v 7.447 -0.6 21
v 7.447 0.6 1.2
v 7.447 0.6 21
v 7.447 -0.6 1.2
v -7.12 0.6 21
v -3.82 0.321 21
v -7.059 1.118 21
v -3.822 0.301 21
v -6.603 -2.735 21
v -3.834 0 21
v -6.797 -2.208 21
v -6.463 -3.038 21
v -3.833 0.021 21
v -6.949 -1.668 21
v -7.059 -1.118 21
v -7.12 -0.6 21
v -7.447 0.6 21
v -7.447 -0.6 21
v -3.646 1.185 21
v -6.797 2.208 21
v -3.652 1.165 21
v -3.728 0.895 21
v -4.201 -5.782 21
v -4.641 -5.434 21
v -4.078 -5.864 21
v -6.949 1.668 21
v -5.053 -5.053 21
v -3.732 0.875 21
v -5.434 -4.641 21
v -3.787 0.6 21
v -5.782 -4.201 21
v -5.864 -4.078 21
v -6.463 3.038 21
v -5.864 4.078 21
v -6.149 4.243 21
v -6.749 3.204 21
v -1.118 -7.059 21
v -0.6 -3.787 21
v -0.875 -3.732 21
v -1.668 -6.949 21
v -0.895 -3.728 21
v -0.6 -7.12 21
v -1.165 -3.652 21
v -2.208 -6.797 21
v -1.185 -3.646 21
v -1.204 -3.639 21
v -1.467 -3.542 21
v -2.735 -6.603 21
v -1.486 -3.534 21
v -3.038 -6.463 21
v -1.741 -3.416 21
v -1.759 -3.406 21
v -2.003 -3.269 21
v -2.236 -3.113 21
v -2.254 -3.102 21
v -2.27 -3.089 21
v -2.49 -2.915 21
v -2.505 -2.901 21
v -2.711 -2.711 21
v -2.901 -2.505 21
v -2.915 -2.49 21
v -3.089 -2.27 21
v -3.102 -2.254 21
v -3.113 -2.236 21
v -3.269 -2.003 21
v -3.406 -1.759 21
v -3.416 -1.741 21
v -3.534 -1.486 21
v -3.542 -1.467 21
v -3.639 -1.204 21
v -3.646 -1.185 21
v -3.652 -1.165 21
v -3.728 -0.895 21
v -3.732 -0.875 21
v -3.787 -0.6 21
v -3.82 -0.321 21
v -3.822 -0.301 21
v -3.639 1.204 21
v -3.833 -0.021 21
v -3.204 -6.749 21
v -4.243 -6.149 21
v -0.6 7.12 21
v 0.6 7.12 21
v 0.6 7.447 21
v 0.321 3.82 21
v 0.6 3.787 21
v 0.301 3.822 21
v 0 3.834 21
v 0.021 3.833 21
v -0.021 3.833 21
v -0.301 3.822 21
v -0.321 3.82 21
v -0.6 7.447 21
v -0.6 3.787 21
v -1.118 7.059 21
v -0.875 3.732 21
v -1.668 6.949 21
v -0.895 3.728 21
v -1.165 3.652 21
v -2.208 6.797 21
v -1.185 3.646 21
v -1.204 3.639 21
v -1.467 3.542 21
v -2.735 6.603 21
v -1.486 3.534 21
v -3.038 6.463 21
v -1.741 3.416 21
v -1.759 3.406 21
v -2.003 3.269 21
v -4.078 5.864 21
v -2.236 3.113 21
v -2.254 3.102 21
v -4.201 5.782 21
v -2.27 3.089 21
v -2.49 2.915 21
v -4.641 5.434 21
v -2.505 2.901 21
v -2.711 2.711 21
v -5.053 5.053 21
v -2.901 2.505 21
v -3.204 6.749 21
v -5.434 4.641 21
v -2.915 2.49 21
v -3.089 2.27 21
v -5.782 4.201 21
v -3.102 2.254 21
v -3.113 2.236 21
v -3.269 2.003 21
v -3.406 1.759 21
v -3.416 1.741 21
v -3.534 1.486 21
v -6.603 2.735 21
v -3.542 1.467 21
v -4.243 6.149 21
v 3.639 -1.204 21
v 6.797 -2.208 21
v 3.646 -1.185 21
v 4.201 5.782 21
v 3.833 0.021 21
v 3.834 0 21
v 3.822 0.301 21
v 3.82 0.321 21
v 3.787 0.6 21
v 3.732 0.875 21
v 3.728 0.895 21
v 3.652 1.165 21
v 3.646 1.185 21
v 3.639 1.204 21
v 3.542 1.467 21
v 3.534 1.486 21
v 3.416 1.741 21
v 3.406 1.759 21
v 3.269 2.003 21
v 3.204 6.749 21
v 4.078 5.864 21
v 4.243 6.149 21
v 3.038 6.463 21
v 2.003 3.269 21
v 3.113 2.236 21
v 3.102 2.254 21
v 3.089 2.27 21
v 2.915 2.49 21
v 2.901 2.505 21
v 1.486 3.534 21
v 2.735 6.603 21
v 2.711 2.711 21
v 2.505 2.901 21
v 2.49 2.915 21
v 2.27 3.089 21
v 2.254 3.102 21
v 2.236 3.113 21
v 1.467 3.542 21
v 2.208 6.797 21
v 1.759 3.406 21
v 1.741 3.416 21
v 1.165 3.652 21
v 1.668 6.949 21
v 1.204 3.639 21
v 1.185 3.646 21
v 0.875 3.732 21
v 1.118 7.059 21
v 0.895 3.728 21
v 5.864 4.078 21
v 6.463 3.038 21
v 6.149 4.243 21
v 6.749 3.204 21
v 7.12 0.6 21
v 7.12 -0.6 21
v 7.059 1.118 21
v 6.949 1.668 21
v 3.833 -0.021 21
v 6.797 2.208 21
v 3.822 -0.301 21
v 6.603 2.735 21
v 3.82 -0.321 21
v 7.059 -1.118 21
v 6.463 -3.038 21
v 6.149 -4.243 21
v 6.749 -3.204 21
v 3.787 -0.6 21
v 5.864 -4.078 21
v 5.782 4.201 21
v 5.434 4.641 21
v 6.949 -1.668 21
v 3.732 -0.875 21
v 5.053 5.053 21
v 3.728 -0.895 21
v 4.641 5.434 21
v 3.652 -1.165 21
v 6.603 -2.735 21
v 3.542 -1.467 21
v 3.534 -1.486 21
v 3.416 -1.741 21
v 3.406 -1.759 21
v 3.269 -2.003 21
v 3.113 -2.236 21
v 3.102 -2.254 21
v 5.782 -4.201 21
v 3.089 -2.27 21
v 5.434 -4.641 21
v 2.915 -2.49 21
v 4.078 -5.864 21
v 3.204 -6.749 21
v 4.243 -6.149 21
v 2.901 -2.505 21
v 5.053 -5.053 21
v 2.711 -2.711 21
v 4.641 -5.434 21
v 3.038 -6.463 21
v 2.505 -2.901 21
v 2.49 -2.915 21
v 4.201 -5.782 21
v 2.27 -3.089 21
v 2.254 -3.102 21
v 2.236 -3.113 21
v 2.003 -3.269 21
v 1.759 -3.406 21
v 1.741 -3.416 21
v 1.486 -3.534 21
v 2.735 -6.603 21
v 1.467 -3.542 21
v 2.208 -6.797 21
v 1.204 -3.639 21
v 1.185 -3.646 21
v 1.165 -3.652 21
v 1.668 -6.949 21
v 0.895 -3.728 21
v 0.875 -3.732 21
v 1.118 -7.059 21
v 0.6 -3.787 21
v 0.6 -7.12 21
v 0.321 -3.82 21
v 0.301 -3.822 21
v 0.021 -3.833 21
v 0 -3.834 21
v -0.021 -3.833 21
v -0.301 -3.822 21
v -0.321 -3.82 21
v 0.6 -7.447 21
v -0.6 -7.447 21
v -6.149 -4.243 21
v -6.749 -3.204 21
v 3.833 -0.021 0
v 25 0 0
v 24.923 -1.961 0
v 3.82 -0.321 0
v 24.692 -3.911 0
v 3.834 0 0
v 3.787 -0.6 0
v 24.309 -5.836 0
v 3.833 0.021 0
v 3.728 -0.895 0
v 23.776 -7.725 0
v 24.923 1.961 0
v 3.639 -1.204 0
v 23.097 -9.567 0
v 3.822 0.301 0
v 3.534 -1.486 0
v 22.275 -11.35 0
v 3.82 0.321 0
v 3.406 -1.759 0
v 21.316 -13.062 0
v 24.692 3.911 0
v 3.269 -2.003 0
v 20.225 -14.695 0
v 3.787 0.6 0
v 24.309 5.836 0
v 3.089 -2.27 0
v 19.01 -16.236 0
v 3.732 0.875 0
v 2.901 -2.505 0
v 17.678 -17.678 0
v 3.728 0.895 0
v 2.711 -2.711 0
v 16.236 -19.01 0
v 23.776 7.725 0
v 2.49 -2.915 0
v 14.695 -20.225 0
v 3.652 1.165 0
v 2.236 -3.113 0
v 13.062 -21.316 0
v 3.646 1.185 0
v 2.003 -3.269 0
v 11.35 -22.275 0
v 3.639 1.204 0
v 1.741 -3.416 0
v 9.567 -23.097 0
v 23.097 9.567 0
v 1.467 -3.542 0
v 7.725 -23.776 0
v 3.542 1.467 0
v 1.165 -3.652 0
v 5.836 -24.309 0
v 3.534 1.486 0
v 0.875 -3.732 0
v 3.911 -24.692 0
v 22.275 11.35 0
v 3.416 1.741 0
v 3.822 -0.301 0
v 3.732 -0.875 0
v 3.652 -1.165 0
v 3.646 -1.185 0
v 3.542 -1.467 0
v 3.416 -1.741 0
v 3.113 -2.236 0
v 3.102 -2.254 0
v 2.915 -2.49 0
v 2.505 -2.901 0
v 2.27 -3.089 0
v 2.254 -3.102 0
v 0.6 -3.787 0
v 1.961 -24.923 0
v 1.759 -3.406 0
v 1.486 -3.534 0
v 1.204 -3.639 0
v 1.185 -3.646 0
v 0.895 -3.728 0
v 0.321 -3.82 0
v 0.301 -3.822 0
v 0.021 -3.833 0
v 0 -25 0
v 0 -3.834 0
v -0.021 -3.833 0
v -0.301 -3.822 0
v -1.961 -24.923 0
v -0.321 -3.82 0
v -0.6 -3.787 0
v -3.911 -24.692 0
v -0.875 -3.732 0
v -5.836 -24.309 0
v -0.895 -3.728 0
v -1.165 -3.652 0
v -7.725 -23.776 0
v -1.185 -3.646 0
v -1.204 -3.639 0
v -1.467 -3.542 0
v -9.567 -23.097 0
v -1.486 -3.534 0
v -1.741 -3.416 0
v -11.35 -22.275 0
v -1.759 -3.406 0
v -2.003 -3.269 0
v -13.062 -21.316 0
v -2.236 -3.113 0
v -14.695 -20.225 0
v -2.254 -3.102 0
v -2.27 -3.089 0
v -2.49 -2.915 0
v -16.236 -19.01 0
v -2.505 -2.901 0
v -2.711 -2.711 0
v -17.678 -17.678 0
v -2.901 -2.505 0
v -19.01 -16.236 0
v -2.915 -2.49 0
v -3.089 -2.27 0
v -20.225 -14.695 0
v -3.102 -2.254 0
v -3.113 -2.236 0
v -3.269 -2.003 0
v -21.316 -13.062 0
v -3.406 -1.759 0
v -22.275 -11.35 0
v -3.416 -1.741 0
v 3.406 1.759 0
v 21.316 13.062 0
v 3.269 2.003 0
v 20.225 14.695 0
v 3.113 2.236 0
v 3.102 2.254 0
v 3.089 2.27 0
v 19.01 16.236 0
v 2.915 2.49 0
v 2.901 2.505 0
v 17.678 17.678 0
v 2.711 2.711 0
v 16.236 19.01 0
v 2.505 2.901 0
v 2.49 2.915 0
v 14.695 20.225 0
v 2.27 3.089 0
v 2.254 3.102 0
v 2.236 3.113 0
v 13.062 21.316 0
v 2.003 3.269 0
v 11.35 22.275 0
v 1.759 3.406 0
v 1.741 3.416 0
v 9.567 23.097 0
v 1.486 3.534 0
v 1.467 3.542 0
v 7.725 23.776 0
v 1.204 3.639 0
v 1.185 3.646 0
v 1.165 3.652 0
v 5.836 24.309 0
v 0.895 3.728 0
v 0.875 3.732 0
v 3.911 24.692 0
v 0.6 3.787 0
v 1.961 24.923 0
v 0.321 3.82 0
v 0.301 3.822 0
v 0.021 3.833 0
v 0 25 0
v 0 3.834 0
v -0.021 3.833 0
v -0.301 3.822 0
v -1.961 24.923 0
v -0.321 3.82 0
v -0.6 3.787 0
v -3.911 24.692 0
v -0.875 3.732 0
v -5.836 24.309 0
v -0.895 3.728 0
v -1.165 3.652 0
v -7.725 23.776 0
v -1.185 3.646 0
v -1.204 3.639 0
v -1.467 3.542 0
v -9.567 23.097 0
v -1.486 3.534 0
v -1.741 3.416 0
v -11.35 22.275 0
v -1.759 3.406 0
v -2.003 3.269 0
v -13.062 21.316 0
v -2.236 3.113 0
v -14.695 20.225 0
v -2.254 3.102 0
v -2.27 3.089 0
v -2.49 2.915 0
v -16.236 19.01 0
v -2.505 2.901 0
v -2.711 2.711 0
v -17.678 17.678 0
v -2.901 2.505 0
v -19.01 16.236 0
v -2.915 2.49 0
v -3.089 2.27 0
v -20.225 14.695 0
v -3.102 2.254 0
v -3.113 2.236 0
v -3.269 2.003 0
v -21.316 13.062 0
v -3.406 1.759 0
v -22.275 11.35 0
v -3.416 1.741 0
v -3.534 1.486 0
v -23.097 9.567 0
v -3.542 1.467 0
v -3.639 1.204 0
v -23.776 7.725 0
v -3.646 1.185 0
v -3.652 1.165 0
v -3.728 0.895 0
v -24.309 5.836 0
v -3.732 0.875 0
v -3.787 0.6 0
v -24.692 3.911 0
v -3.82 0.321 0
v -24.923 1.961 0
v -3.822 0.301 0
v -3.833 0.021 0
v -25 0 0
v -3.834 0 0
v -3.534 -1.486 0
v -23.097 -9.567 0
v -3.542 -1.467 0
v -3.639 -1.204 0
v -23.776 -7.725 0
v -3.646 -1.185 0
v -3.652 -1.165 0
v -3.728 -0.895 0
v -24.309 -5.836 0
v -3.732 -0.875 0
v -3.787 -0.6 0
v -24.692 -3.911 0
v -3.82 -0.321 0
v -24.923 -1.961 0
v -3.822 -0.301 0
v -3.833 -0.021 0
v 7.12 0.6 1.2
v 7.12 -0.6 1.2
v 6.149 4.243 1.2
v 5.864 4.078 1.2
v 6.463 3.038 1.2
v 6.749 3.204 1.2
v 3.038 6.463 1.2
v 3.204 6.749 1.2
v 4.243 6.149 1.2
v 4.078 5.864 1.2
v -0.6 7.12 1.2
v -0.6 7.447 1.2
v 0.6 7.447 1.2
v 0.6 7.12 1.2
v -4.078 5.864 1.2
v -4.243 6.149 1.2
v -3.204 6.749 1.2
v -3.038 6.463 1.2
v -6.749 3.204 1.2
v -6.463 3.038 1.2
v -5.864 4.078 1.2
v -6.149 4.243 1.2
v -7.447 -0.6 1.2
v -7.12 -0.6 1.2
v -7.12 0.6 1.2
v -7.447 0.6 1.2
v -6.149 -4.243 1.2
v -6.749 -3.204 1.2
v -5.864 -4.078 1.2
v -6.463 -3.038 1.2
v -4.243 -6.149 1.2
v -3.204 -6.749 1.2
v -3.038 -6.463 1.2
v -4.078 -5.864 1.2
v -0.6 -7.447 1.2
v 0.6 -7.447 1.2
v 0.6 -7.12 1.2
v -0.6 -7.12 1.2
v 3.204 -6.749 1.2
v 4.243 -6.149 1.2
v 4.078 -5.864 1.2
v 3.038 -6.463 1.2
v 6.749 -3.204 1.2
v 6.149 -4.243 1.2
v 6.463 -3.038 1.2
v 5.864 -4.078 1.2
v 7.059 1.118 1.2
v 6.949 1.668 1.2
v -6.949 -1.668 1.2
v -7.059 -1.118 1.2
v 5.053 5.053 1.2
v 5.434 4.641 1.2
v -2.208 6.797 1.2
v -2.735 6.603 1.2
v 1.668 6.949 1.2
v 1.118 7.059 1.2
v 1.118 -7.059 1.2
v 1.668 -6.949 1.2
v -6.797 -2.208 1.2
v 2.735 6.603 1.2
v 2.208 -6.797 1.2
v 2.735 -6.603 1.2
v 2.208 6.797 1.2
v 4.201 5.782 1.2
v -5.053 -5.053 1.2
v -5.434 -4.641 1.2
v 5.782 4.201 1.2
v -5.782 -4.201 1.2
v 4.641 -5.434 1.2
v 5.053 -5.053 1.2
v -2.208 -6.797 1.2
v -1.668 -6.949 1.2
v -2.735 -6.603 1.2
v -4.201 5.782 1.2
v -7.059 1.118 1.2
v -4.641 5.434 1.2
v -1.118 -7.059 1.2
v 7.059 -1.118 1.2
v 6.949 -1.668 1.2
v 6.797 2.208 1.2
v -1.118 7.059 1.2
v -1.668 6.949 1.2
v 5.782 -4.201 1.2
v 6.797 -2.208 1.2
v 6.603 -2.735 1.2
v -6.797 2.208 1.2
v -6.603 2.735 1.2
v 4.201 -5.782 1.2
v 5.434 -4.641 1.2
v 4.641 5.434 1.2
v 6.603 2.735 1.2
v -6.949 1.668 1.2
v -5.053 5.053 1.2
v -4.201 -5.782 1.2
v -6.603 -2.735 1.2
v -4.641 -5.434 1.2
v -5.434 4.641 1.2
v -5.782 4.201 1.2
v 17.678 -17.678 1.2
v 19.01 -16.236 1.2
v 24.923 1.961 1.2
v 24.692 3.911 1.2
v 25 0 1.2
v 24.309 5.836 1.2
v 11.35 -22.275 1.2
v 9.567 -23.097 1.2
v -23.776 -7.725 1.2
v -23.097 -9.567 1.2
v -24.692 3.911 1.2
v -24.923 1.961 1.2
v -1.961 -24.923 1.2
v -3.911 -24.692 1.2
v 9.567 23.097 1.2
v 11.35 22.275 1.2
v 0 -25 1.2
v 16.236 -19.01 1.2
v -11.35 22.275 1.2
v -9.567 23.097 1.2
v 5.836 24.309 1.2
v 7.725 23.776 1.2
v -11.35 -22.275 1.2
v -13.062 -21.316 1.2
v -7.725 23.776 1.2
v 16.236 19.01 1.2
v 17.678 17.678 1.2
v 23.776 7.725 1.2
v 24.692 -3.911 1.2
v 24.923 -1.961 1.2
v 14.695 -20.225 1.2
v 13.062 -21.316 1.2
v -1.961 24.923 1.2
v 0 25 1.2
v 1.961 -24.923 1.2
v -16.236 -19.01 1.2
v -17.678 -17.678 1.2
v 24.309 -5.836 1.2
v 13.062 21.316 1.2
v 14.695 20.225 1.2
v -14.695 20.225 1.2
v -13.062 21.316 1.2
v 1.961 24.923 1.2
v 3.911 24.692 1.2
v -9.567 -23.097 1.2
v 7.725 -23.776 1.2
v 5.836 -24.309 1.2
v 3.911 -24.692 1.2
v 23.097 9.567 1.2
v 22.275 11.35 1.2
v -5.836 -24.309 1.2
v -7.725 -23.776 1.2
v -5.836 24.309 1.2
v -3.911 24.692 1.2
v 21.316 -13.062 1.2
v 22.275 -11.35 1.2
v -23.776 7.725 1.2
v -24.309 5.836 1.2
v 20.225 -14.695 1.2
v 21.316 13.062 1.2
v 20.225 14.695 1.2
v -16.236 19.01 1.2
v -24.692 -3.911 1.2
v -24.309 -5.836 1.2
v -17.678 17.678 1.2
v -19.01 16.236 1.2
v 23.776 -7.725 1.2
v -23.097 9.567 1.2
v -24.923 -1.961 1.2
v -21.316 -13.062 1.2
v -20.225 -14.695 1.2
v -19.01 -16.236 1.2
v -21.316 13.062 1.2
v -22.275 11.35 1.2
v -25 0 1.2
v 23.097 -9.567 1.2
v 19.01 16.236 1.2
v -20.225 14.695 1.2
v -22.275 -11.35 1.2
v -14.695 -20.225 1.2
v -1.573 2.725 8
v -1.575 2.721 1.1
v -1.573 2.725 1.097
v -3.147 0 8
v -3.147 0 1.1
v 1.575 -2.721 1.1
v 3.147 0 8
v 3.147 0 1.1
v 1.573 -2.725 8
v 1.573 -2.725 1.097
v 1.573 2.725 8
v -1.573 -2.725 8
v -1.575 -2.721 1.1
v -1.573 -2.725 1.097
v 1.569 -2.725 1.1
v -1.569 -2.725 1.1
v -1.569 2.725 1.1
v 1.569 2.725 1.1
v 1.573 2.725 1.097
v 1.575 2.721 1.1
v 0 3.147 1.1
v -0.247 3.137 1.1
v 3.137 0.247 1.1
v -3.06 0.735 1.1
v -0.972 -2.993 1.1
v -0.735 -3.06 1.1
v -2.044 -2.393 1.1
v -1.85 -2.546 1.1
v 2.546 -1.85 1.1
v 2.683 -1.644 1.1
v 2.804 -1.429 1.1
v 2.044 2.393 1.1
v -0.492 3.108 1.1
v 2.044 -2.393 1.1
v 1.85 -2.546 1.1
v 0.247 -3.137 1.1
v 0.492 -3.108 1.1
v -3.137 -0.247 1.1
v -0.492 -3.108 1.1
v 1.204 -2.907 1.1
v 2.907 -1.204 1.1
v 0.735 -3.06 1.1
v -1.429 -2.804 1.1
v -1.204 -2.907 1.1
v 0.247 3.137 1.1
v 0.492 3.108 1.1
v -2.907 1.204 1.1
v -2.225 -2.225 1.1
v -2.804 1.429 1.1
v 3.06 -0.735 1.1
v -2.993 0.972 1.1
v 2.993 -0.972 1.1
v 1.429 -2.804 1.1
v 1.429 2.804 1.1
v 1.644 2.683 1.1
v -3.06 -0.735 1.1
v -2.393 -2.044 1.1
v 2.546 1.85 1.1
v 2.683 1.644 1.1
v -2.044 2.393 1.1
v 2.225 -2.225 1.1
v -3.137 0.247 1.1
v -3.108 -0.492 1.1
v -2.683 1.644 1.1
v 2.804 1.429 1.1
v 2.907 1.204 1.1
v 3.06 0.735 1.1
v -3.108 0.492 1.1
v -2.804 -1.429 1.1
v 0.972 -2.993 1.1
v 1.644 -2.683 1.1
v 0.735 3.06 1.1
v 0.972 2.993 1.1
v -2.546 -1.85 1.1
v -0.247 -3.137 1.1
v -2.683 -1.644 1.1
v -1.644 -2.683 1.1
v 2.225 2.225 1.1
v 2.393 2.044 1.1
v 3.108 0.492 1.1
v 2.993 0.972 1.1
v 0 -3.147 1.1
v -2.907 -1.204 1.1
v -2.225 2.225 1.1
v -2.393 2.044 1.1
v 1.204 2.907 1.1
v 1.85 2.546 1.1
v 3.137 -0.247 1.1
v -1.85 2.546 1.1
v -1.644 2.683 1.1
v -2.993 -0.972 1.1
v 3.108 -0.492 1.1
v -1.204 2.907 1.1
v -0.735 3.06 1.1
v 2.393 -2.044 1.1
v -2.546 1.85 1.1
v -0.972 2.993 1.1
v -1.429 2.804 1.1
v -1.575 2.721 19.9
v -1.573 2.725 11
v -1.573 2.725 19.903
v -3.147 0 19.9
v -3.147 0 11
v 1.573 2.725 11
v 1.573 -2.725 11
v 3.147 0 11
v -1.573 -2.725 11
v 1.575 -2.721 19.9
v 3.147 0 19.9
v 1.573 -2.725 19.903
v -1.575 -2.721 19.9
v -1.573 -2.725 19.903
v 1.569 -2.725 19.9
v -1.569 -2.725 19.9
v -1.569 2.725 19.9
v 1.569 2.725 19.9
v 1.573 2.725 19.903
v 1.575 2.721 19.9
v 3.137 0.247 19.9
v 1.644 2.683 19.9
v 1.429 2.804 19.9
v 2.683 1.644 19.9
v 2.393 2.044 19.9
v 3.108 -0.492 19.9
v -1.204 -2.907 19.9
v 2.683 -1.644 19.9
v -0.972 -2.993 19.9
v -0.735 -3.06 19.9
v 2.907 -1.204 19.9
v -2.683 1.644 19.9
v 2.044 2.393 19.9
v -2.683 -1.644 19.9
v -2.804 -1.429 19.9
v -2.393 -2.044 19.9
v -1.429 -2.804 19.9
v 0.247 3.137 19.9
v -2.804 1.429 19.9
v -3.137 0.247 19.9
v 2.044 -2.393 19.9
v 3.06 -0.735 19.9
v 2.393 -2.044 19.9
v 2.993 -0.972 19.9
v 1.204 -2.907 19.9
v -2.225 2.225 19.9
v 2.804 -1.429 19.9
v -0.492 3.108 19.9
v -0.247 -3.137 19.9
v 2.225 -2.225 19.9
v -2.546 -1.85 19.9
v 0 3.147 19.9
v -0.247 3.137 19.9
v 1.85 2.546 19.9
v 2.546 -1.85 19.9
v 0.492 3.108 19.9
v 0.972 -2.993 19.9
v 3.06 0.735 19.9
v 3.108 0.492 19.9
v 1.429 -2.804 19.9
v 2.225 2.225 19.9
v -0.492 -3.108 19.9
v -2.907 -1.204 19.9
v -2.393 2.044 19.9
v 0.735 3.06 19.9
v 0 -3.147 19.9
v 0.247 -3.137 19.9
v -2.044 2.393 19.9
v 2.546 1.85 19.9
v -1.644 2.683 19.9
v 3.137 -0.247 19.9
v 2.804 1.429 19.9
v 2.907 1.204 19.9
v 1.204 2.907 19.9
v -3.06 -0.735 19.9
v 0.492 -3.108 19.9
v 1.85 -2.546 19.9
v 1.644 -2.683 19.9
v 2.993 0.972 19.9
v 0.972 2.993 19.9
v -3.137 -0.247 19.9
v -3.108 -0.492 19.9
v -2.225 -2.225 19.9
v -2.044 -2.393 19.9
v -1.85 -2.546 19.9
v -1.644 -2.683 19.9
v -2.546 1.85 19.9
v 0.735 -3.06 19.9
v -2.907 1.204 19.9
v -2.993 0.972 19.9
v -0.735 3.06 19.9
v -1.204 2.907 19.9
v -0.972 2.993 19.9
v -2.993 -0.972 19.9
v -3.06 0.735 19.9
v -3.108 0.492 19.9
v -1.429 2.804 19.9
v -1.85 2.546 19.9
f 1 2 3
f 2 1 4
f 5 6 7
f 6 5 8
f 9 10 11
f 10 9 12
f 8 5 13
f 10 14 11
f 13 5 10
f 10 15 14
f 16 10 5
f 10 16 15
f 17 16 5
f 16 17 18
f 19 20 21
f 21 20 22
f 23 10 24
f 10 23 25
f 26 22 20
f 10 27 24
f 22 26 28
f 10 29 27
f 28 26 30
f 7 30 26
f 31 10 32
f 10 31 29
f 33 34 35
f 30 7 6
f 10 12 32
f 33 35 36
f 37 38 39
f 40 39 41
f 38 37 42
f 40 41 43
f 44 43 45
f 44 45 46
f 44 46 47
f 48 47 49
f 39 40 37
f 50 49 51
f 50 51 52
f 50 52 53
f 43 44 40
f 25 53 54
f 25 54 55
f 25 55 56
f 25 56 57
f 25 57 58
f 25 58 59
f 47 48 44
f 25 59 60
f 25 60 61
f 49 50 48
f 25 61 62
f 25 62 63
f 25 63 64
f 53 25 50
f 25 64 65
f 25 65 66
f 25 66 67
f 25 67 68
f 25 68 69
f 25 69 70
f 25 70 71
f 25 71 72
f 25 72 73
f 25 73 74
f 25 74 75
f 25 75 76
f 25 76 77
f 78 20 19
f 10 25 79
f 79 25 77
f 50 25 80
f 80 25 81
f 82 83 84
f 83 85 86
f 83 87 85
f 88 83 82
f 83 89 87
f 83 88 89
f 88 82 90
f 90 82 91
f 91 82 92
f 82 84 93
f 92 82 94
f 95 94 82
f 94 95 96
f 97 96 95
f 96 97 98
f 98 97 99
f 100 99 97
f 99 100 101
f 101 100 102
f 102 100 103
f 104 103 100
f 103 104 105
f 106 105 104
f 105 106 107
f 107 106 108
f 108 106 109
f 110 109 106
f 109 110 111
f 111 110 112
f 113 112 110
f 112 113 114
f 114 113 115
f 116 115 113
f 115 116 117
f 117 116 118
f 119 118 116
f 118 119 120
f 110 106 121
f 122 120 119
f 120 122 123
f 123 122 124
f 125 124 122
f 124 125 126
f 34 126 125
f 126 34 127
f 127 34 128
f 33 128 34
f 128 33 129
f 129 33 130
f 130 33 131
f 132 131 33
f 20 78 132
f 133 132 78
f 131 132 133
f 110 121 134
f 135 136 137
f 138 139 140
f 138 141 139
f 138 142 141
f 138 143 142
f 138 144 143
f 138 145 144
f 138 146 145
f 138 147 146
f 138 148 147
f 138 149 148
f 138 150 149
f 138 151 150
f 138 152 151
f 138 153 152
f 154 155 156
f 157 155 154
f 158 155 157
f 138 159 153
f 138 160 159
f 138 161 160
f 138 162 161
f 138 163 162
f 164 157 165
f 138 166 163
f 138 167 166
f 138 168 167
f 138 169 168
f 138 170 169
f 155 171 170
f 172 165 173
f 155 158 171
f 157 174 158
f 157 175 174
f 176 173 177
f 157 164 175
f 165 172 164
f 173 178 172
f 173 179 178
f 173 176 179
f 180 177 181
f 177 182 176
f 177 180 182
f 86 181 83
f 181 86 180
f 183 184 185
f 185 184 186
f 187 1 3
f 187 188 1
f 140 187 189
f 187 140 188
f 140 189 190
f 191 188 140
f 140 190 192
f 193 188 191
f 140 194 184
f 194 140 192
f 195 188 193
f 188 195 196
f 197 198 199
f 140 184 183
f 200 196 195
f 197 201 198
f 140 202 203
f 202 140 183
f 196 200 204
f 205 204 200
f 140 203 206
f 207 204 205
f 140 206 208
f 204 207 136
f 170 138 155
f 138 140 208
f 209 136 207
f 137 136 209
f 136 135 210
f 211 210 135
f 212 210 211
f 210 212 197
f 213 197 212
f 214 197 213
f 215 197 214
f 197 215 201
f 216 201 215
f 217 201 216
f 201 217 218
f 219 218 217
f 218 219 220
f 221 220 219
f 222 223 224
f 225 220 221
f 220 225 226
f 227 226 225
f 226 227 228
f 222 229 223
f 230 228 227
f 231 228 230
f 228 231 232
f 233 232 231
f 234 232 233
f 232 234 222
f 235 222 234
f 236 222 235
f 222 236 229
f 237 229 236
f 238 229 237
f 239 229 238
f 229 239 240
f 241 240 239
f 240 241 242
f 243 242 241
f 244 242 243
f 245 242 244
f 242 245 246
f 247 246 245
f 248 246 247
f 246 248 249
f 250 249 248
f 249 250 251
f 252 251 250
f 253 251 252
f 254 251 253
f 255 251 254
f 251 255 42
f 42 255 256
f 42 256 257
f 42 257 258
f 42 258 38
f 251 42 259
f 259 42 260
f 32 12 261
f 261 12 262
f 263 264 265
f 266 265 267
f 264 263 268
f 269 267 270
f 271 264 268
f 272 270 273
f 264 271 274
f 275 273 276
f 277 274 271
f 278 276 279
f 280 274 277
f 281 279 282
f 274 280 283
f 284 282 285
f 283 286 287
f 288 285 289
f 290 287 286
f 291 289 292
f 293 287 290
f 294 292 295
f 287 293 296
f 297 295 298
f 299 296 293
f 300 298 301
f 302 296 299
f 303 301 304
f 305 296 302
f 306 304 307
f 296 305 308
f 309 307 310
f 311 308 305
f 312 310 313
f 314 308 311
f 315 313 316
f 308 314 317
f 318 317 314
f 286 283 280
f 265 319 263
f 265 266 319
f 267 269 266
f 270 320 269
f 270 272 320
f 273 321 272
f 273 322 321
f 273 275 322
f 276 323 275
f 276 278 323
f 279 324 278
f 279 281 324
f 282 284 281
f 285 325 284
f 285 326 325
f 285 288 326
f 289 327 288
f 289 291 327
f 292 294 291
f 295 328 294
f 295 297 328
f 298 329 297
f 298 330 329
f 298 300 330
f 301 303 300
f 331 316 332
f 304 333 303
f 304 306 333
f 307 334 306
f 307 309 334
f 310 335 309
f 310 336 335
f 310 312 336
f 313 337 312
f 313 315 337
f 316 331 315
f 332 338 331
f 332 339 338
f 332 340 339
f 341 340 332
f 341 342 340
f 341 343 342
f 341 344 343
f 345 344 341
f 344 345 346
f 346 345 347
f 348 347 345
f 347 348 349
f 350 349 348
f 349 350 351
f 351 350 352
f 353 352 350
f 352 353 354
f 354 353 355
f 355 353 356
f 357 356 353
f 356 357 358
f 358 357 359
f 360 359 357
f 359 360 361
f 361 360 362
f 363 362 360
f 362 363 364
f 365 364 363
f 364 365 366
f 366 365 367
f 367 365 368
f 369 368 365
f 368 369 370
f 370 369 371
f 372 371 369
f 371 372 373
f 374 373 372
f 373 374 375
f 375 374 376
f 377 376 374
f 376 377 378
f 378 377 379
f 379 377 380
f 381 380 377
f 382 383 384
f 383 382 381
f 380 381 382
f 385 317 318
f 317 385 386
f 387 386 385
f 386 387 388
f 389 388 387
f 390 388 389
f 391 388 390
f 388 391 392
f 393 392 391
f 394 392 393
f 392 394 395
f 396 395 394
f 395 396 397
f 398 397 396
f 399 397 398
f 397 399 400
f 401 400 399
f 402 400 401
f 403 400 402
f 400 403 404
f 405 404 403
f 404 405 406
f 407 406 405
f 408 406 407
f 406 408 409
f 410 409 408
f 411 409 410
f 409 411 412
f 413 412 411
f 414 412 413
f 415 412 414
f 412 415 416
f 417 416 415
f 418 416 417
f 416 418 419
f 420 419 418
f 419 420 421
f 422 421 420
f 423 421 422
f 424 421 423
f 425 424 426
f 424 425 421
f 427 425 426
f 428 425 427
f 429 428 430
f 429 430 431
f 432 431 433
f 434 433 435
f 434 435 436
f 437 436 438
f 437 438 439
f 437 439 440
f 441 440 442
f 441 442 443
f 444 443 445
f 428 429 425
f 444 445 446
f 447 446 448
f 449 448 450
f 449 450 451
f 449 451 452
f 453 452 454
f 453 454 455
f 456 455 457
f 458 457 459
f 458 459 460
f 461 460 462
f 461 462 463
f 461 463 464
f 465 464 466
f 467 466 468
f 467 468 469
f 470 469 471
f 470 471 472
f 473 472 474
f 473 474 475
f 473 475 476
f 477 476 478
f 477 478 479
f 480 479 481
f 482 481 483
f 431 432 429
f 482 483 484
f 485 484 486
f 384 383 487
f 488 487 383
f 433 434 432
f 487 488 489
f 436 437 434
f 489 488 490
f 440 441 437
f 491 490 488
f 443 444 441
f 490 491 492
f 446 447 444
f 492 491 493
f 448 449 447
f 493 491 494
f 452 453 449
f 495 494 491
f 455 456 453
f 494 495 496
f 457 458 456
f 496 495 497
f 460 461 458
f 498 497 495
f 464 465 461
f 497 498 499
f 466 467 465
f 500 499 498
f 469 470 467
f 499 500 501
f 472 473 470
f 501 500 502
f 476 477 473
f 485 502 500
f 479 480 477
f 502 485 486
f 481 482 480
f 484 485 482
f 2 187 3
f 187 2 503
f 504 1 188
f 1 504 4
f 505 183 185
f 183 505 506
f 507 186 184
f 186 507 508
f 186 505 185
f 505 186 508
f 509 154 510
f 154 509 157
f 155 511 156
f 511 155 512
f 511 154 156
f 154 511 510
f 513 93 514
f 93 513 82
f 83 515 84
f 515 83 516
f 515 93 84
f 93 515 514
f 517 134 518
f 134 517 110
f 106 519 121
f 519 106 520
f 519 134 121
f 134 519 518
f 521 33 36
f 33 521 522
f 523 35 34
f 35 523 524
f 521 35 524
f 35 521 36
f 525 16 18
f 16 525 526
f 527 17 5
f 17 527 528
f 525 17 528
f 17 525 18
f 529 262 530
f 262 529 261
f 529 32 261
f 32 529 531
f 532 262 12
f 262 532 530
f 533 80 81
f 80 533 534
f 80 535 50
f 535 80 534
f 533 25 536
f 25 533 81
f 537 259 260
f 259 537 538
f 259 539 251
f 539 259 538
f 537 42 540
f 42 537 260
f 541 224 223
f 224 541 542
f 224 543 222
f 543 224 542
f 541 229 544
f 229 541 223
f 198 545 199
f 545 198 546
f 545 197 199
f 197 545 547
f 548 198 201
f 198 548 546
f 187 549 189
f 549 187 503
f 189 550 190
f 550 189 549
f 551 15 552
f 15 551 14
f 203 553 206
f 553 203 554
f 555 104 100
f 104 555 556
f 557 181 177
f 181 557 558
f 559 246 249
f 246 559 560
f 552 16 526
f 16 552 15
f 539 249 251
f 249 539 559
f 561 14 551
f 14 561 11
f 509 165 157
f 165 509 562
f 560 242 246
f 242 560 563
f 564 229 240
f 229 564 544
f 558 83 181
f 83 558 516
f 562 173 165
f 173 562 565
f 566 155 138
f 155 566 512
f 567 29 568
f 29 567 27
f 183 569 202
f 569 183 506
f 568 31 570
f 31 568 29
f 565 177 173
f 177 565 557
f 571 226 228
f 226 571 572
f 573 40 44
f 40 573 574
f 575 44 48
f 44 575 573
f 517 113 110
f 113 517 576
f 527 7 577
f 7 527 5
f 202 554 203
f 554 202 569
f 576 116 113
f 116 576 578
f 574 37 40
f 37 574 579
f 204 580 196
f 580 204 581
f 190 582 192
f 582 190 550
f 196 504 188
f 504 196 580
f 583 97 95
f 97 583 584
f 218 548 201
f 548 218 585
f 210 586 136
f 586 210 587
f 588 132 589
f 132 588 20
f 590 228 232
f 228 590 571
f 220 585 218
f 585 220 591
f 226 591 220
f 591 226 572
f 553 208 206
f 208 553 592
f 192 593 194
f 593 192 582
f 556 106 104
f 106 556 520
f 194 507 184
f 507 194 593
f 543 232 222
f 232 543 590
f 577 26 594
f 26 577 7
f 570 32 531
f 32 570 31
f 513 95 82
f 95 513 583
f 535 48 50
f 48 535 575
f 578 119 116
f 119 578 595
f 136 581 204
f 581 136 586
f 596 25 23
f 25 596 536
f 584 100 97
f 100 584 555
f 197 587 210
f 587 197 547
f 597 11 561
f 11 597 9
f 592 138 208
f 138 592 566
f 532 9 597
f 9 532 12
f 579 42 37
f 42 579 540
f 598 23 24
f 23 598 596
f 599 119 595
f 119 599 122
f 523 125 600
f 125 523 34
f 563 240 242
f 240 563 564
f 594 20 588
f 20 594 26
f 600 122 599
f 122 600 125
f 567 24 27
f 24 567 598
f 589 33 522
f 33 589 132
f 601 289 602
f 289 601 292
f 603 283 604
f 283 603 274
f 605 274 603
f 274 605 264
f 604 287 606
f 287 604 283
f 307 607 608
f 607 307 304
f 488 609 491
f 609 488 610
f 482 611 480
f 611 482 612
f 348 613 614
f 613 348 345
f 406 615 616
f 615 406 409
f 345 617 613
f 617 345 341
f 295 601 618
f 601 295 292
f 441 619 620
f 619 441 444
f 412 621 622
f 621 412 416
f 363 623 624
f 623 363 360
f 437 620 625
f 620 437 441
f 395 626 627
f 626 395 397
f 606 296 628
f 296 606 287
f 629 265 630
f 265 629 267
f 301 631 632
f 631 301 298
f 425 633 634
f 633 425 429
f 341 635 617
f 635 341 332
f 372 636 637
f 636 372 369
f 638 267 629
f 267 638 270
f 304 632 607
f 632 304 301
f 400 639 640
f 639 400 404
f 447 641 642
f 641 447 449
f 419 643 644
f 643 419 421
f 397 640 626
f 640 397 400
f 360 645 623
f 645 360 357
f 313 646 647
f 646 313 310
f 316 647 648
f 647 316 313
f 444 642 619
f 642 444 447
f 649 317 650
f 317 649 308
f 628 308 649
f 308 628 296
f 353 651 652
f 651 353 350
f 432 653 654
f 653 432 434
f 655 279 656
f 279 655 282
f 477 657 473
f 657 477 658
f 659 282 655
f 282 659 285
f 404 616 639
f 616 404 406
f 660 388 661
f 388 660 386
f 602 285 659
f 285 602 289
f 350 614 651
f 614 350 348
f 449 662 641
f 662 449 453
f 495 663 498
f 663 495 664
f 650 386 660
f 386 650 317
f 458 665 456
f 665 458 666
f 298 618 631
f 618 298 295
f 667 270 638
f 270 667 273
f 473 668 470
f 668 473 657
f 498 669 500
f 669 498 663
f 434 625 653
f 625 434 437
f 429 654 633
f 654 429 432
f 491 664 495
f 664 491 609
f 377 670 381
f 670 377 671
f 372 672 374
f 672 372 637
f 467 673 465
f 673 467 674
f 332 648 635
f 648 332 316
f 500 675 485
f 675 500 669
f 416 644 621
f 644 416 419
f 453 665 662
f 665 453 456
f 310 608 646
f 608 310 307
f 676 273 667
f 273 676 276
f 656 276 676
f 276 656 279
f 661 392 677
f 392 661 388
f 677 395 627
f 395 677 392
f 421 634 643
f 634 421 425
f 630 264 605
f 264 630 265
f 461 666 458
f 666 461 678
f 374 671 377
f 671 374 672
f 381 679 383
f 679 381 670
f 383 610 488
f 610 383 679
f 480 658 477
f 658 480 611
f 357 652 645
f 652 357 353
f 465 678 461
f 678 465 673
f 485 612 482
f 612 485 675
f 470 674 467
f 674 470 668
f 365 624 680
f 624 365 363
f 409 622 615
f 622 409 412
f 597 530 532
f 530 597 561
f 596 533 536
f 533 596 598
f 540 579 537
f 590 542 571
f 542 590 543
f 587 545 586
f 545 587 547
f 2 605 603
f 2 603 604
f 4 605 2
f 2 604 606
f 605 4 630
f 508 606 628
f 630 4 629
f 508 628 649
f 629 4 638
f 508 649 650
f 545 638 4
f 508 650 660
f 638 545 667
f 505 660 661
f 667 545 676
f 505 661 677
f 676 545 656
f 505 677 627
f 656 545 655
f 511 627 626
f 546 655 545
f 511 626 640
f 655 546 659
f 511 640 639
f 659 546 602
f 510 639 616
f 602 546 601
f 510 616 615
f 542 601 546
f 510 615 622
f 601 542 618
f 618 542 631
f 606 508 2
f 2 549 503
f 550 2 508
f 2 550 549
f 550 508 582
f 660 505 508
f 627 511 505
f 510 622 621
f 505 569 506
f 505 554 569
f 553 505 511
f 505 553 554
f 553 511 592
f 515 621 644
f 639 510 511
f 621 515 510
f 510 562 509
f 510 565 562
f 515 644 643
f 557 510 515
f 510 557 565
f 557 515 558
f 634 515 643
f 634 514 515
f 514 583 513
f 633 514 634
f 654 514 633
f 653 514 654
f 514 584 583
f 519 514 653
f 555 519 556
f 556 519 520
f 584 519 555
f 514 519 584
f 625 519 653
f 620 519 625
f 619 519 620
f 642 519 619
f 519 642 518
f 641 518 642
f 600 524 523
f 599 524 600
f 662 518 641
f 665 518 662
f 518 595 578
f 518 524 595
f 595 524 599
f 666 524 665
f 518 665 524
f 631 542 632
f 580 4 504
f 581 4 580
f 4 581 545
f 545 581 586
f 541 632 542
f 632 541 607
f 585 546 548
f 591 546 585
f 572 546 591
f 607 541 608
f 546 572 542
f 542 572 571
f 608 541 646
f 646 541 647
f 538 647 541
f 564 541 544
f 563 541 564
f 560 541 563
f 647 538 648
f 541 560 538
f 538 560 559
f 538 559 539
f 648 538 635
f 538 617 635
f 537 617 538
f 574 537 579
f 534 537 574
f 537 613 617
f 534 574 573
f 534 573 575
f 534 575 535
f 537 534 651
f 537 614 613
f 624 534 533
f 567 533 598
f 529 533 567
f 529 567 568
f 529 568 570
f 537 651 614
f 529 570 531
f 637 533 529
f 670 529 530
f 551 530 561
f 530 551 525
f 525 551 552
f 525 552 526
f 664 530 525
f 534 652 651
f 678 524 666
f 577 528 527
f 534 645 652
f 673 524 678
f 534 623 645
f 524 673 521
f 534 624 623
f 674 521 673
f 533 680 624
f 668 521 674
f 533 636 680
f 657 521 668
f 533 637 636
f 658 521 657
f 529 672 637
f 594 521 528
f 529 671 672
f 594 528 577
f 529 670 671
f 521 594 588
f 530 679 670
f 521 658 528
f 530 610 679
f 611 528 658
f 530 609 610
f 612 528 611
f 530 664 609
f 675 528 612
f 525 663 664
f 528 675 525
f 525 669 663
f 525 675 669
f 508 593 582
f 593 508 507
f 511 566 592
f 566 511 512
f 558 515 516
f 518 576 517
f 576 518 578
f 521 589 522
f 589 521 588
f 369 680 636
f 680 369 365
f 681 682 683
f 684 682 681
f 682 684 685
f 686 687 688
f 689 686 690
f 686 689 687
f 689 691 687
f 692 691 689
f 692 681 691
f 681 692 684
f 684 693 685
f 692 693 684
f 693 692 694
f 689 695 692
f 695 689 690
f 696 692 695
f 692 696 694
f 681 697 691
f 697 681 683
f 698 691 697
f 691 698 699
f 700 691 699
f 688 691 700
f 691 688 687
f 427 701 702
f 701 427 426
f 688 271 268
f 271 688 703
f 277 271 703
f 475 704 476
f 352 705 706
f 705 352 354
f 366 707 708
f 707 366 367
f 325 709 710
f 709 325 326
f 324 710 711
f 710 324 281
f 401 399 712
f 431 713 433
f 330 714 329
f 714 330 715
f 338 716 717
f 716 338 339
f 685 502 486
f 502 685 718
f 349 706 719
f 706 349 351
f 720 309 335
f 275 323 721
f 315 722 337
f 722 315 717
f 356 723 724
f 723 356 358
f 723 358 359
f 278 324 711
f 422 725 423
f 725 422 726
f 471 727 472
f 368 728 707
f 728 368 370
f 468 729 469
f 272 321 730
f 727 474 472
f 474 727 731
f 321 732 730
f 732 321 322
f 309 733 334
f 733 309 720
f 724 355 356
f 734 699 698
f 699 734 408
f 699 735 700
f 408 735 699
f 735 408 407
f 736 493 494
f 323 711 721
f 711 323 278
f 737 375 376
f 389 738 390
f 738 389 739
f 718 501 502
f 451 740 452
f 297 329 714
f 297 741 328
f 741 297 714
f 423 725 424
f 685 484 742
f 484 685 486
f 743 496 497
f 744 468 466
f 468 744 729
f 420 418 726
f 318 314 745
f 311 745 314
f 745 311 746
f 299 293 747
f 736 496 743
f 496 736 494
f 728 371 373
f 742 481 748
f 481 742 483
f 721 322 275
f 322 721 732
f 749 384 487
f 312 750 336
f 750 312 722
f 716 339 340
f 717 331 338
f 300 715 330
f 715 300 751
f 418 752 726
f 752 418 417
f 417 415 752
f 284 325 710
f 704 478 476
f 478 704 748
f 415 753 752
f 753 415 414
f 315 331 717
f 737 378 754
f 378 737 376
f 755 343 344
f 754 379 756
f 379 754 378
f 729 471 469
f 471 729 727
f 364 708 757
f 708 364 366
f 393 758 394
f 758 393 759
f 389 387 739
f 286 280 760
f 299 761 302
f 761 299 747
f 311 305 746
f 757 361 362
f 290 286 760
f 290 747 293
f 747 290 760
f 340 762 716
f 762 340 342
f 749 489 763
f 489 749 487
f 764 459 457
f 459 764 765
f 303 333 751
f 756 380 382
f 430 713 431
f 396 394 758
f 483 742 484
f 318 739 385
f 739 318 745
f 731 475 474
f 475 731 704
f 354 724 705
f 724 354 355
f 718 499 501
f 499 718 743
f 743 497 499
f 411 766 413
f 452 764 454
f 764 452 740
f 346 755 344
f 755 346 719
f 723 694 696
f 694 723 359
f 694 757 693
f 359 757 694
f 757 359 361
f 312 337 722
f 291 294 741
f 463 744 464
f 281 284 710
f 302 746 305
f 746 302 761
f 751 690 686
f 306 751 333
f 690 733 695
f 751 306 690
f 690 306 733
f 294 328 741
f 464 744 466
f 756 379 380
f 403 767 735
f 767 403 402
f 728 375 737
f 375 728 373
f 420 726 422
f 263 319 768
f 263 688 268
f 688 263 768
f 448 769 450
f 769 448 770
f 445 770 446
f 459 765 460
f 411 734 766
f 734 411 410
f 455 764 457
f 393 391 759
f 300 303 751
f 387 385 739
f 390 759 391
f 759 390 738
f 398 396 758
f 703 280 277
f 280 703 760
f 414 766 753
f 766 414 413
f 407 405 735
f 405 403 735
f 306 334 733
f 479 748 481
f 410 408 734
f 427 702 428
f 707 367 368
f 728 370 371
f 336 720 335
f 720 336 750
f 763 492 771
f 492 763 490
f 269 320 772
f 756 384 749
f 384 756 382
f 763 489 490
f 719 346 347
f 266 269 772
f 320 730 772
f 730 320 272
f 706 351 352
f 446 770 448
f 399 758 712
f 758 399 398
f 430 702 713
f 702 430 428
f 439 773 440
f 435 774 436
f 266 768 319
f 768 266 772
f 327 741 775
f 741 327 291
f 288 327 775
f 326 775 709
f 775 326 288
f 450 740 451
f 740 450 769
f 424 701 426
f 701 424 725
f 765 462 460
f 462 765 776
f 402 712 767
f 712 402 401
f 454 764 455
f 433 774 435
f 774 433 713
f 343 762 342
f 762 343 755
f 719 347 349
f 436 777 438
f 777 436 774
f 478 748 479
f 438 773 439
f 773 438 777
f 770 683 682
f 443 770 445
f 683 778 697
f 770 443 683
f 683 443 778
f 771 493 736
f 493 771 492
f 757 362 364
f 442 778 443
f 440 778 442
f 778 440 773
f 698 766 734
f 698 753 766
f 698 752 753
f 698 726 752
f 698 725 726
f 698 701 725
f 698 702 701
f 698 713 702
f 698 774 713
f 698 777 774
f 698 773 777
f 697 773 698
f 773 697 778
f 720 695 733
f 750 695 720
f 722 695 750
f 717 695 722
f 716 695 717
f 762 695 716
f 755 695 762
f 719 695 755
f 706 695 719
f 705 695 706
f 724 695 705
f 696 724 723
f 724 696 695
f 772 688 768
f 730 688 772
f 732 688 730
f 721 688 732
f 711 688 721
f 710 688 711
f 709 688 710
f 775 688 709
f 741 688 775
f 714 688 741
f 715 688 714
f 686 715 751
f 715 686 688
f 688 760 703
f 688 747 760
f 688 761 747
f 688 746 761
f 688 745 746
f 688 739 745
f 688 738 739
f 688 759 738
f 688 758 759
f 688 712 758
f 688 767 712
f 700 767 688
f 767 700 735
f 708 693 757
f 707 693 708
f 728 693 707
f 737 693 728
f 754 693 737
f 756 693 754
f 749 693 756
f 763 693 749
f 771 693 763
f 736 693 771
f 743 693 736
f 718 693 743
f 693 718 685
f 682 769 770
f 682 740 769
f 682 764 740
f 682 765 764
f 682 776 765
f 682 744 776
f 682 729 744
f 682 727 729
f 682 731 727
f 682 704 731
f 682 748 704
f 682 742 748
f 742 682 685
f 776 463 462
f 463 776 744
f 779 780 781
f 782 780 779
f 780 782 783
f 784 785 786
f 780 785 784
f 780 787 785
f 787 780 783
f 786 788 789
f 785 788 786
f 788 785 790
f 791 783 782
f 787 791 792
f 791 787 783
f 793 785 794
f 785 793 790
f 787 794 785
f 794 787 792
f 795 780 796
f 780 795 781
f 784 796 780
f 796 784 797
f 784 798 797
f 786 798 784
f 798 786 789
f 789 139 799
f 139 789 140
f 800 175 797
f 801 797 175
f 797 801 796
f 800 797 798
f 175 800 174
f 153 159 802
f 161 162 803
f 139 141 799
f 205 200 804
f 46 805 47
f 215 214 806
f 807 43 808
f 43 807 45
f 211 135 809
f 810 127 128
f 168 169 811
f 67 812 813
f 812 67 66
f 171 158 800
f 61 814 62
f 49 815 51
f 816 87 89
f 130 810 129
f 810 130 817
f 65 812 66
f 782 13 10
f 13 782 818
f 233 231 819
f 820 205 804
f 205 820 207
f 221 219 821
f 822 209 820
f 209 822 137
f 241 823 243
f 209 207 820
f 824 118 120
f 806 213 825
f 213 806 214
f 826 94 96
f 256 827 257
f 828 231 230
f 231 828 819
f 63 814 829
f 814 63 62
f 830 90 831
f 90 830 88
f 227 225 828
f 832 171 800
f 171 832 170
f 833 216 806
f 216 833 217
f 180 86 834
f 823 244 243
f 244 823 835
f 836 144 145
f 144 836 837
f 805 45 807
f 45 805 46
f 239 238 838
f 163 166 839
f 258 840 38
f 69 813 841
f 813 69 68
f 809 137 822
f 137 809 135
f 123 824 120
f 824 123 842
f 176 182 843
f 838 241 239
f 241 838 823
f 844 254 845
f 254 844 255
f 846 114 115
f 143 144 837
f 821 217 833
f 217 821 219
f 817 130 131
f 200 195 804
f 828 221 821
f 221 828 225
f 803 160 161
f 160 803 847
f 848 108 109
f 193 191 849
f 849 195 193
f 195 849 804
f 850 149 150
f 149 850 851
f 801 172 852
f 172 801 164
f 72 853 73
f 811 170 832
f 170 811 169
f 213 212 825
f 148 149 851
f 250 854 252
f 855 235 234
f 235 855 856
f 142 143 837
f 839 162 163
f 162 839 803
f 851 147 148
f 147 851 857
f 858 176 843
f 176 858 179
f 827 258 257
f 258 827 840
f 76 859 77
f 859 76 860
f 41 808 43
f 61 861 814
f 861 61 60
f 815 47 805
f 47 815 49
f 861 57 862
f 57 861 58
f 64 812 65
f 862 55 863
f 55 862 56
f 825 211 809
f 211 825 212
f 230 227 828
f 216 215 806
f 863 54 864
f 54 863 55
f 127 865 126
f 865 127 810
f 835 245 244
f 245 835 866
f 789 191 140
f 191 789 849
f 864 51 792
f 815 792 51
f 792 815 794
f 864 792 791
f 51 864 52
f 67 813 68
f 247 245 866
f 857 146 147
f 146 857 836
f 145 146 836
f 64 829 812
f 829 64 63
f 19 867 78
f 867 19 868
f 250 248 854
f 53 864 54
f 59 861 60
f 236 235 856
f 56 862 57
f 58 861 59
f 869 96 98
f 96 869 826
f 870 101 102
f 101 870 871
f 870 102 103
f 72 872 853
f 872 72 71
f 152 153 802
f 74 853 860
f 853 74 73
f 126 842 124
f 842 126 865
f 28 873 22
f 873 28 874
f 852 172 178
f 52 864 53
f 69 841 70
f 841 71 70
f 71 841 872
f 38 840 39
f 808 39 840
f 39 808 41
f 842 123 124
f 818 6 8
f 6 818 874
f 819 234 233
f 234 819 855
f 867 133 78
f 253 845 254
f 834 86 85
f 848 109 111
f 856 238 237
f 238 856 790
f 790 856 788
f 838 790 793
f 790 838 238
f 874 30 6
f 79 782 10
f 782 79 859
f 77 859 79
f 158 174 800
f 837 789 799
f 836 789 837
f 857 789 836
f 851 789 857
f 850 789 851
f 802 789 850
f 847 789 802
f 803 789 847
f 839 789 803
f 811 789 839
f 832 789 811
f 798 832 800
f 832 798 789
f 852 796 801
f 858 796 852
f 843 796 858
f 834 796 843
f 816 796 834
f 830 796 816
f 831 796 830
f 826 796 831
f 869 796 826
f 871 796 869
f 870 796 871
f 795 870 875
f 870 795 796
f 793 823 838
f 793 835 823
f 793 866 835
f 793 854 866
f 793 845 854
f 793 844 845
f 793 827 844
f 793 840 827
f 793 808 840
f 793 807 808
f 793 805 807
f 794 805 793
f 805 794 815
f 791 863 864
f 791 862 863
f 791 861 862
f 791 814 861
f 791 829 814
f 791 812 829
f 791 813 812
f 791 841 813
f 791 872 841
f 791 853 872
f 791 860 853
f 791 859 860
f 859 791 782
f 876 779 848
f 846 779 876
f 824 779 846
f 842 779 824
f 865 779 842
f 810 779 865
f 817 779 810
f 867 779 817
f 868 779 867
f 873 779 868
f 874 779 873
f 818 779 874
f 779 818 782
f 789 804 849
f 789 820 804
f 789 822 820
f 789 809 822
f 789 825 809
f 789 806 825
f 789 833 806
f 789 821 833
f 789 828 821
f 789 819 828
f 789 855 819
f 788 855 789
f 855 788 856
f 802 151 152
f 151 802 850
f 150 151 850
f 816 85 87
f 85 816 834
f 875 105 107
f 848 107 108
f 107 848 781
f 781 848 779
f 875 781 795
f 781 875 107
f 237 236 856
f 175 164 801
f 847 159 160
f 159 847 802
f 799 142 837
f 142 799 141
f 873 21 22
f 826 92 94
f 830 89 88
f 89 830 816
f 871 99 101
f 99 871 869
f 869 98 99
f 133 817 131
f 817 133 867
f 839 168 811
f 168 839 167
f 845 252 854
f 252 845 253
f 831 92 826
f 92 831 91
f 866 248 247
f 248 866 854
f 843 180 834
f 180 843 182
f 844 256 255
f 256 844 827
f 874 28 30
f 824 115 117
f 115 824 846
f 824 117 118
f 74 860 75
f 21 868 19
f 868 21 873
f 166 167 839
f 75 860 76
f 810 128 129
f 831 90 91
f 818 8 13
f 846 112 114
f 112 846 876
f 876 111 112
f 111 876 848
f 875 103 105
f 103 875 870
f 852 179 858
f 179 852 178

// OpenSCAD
// Timemore C5 ESP Grinder <-> Screwdriver Adapter V7
// Both ends female hex socket - no breakable shaft
// Bottom: M5 hex socket (receives grinder's M5 hex drive shaft)
// Top: M5 hex socket (receives a hex bit from screwdriver)

$fn = 80;

// === Hex dimensions ===
// Grinder shaft: M5 hex (5mm across flats)
m5_af = 5.0 + 0.45;   // across flats + print clearance
m5_depth_bottom = 8;   // grinder shaft engagement depth

// Top socket: M5 hex (5mm across flats)
m5_depth_top = 10;     // bit insertion depth

// Wall thickness between hex socket and outer wall
wall_min = 4;          // minimum wall around hex socket

// Body
body_d = m5_af / cos(30) + wall_min * 2;  // auto-sized from hex + wall
body_h = m5_depth_bottom + m5_depth_top + 3; // +3mm solid middle section

// Lid to cover grinder opening (prevent beans from spilling)
lid_d = 50;            // 5cm diameter
lid_h = 1.2;           // thinner lid

module hex(af, h) {
    linear_extrude(height = h)
        circle(d = af / cos(30), $fn = 6);
}

module adapter() {
    difference() {
        union() {
            // Main cylindrical body
            cylinder(d = body_d, h = body_h);

            // Knurling ridges for grip
            for (a = [0:30:330]) {
                rotate([0, 0, a])
                    translate([body_d/2 - 0.3, -0.6, 0])
                        cube([0.6, 1.2, body_h]);
            }

            // Lid disc at bottom (no support needed for printing)
            cylinder(d = lid_d, h = lid_h);
        }

        // Bottom M5 hex socket (for grinder shaft)
        translate([0, 0, -0.1])
            hex(m5_af, m5_depth_bottom + 0.1);

        // Bottom entry chamfer
        translate([0, 0, -0.1])
            cylinder(d1 = m5_af / cos(30) + 1.5, d2 = m5_af / cos(30), h = 1.2);

        // Top M5 hex socket (for screwdriver bit)
        translate([0, 0, body_h - m5_depth_top])
            hex(m5_af, m5_depth_top + 0.1);

        // Top entry chamfer
        translate([0, 0, body_h + 0.1])
            mirror([0, 0, 1])
                cylinder(d1 = m5_af / cos(30) + 1.5, d2 = m5_af / cos(30), h = 1.2);
    }
}

adapter();
